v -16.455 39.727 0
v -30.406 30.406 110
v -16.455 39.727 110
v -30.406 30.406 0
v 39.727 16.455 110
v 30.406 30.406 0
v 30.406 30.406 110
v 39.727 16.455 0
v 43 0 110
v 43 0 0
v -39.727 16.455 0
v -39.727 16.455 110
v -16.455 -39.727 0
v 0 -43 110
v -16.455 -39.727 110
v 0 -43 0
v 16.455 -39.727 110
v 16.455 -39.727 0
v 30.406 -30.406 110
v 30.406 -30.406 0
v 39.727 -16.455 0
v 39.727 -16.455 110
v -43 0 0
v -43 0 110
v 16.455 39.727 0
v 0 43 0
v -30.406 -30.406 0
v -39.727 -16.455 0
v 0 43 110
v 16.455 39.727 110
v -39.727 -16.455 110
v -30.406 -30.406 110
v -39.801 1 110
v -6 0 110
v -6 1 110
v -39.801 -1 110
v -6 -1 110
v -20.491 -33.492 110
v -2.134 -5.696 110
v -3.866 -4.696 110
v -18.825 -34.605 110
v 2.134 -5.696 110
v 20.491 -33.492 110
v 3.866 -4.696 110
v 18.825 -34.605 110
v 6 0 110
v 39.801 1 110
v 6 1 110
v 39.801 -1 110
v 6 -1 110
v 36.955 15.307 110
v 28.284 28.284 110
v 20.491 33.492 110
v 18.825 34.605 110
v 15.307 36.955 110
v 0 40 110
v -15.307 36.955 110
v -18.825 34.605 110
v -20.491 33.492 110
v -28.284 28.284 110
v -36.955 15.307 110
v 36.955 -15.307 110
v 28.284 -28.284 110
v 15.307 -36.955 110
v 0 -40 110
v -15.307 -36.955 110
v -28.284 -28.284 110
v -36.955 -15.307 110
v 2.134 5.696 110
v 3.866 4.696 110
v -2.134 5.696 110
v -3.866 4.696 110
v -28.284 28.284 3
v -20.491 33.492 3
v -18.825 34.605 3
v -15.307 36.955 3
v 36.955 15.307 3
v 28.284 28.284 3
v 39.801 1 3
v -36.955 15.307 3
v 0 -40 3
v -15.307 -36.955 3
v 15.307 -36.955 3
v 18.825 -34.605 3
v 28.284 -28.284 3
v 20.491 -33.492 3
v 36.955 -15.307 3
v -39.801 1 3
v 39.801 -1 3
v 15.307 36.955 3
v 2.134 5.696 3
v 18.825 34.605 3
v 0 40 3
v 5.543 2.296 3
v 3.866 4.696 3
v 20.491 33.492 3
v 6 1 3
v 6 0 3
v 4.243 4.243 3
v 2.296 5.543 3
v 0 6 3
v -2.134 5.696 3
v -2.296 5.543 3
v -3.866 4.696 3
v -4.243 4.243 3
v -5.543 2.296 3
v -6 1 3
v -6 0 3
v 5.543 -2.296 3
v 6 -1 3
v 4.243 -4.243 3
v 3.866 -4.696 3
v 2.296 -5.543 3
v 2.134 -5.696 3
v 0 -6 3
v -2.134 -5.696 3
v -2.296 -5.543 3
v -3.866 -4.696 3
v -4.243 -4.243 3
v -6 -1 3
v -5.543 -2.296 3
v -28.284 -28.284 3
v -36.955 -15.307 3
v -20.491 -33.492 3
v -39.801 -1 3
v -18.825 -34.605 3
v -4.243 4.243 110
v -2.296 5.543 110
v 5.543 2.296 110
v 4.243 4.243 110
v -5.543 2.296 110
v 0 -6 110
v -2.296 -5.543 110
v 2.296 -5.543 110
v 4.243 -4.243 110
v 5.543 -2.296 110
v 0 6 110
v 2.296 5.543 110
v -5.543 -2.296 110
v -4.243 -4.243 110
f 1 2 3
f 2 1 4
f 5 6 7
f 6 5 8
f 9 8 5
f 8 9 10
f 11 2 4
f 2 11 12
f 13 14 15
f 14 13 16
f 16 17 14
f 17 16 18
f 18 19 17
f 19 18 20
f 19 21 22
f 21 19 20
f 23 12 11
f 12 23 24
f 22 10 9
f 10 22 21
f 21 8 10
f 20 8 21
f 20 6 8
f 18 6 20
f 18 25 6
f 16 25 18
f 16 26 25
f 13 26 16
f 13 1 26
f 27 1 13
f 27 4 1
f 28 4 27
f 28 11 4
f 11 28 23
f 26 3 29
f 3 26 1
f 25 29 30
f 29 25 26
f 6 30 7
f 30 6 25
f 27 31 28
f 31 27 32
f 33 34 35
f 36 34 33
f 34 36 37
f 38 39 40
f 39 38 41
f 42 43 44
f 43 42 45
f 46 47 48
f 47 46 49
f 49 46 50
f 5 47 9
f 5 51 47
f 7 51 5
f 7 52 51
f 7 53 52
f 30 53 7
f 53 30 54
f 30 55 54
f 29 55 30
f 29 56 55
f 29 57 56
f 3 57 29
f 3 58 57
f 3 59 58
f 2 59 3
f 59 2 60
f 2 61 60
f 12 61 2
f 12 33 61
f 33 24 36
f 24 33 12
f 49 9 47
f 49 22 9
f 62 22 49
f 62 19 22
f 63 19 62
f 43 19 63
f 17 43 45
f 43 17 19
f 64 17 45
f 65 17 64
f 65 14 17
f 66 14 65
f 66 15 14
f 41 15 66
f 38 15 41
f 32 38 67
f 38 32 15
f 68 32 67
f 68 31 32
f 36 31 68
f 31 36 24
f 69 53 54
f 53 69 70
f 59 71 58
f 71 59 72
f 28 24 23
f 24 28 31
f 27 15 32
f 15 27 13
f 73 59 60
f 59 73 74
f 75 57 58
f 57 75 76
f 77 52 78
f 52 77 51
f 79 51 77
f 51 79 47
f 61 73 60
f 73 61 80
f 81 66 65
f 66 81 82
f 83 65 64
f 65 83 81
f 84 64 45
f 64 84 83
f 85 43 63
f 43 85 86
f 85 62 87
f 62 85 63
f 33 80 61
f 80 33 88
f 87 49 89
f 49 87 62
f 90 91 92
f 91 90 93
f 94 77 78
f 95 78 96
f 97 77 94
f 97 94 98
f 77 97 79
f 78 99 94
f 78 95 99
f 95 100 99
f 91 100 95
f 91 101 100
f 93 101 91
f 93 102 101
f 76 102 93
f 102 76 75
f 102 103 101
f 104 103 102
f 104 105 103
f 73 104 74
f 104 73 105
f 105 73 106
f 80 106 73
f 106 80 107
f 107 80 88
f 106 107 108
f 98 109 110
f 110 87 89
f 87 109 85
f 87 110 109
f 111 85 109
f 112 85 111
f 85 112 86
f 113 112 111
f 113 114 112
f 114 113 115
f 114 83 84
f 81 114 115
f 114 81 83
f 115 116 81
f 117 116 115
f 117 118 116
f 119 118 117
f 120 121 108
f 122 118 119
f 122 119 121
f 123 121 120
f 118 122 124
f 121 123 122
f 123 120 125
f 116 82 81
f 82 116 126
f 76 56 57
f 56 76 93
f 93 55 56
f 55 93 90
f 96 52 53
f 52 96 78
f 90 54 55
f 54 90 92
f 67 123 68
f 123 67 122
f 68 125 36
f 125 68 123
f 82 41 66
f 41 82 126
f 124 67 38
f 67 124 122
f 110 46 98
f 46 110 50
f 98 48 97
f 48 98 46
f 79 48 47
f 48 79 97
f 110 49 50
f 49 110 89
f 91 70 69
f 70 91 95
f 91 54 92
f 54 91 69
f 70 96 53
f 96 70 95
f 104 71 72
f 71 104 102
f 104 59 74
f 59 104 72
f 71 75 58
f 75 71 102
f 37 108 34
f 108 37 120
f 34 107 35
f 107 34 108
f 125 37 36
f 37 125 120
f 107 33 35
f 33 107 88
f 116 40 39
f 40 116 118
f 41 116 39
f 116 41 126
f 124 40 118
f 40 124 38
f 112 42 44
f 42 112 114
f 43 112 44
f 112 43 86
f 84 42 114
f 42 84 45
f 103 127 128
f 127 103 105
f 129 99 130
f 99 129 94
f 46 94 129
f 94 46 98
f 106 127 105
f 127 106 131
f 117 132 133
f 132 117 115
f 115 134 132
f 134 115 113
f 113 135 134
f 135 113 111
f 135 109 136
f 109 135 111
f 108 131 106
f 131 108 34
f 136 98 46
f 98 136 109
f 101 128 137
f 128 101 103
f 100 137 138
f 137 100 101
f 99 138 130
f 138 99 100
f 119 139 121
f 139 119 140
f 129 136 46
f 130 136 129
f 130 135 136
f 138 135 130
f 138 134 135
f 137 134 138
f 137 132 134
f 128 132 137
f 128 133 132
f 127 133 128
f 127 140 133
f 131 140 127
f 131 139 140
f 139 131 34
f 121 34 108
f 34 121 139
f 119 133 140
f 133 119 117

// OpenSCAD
// Parametrischer Stiftköcher (OpenSCAD)
// Version 1.0

// --- Konfiguration ---
inner_diameter = 80;     // Innendurchmesser (mm)
height         = 110;    // Höhe (mm)
wall_thickness = 3;      // Wandstärke (mm)
bottom_thickness = 3;    // Bodenstärke (mm)

// Innenstruktur: "none", "radial", "grid"
insert_type    = "radial";

// Radiale Einsätze
compartments   = 6;      // Anzahl Fächer (z.B. 3–12)
insert_thickness = 2;    // Dicke der Trennwände (mm)

// Grid-Einsätze (Waben/Gitter)
cell_size      = 18;     // Zellenweite (mm)
cell_thickness = 2;      // Stegdicke (mm)

// Fillet oben (kleine Fase)
top_chamfer    = 1.2;    // 0 für keine Fase

$fn = 16; // Rundungen fein 128

// --- Hauptmodell ---
module pen_holder() {
    // Außenkörper
    difference() {
        // Mantel + Boden
        union() {
            // Mantel
            cylinder(h = height, r = (inner_diameter/2) + wall_thickness);

            // Boden
            translate([0,0,0])
                cylinder(h = bottom_thickness,
                         r = (inner_diameter/2) + wall_thickness);

            // Optional: kleine Fase oben
            if (top_chamfer > 0) {
                translate([0,0,height-top_chamfer])
                    cylinder(h = top_chamfer,
                             r1 = (inner_diameter/2) + wall_thickness,
                             r2 = (inner_diameter/2) + wall_thickness - top_chamfer);
            }
        }

        // Innenaushöhlung
        translate([0,0,bottom_thickness])
            cylinder(h = height - bottom_thickness,
                     r = inner_diameter/2);
    }

    // Innenstruktur einsetzen
    if (insert_type == "radial") {
        radial_insert();
    } else if (insert_type == "grid") {
        grid_insert();
    }
}

// --- Radiale Fächer ---
module radial_insert() {
    // Zentrale Nabe, damit Trennwände stabil sind
    hub_radius = min(6, inner_diameter/6);

    union() {
        // Nabe
        translate([0,0,bottom_thickness])
            cylinder(h = height - bottom_thickness,
                     r = hub_radius);

        // Trennwände
        for (i = [0:compartments-1]) {
            angle = 360/compartments * i;
            rotate([0,0,angle])
                translate([hub_radius, -insert_thickness/2, bottom_thickness])
                    cube([ (inner_diameter/2) - hub_radius,
                           insert_thickness,
                           height - bottom_thickness ]);
        }
    }
}

// --- Gittereinsatz (quadratisches Raster) ---
module grid_insert() {
    usable_radius = inner_diameter/2 - 0.6; // kleiner Spielraum
    usable_d = usable_radius*2;

    translate([0,0,bottom_thickness])
    linear_extrude(height = height - bottom_thickness)
    difference() {
        // Kreisbegrenzung für das Gitter
        circle(r = usable_radius);

        // Wir schneiden negative Flächen NICHT, stattdessen bauen wir das Gitter positiv:
        // Trick: Wir machen die Kreisfläche und subtrahieren große leere Flächen,
        // dann addieren die Stege separat unten.
    }

    // Gitterstege als positives Volumen
    union() {
        // Vertikale Stege
        for (x = [-floor(usable_d/cell_size):floor(usable_d/cell_size)]) {
            xpos = x * cell_size;
            if (abs(xpos) <= usable_radius) {
                translate([xpos,0,bottom_thickness])
                    linear_extrude(height = height - bottom_thickness)
                        offset(r = cell_thickness/2)
                            square([0.001, usable_d], center = true);
            }
        }
        // Horizontale Stege
        for (y = [-floor(usable_d/cell_size):floor(usable_d/cell_size)]) {
            ypos = y * cell_size;
            if (abs(ypos) <= usable_radius) {
                translate([0,ypos,bottom_thickness])
                    linear_extrude(height = height - bottom_thickness)
                        offset(r = cell_thickness/2)
                            square([usable_d, 0.001], center = true);
            }
        }
        // Begrenzungsring innen für saubere Kante
        translate([0,0,bottom_thickness])
            linear_extrude(height = height - bottom_thickness)
                difference() {
                    circle(r = usable_radius);
                    circle(r = usable_radius - cell_thickness);
                }
    }
}

// --- Aufruf ---
pen_holder();
